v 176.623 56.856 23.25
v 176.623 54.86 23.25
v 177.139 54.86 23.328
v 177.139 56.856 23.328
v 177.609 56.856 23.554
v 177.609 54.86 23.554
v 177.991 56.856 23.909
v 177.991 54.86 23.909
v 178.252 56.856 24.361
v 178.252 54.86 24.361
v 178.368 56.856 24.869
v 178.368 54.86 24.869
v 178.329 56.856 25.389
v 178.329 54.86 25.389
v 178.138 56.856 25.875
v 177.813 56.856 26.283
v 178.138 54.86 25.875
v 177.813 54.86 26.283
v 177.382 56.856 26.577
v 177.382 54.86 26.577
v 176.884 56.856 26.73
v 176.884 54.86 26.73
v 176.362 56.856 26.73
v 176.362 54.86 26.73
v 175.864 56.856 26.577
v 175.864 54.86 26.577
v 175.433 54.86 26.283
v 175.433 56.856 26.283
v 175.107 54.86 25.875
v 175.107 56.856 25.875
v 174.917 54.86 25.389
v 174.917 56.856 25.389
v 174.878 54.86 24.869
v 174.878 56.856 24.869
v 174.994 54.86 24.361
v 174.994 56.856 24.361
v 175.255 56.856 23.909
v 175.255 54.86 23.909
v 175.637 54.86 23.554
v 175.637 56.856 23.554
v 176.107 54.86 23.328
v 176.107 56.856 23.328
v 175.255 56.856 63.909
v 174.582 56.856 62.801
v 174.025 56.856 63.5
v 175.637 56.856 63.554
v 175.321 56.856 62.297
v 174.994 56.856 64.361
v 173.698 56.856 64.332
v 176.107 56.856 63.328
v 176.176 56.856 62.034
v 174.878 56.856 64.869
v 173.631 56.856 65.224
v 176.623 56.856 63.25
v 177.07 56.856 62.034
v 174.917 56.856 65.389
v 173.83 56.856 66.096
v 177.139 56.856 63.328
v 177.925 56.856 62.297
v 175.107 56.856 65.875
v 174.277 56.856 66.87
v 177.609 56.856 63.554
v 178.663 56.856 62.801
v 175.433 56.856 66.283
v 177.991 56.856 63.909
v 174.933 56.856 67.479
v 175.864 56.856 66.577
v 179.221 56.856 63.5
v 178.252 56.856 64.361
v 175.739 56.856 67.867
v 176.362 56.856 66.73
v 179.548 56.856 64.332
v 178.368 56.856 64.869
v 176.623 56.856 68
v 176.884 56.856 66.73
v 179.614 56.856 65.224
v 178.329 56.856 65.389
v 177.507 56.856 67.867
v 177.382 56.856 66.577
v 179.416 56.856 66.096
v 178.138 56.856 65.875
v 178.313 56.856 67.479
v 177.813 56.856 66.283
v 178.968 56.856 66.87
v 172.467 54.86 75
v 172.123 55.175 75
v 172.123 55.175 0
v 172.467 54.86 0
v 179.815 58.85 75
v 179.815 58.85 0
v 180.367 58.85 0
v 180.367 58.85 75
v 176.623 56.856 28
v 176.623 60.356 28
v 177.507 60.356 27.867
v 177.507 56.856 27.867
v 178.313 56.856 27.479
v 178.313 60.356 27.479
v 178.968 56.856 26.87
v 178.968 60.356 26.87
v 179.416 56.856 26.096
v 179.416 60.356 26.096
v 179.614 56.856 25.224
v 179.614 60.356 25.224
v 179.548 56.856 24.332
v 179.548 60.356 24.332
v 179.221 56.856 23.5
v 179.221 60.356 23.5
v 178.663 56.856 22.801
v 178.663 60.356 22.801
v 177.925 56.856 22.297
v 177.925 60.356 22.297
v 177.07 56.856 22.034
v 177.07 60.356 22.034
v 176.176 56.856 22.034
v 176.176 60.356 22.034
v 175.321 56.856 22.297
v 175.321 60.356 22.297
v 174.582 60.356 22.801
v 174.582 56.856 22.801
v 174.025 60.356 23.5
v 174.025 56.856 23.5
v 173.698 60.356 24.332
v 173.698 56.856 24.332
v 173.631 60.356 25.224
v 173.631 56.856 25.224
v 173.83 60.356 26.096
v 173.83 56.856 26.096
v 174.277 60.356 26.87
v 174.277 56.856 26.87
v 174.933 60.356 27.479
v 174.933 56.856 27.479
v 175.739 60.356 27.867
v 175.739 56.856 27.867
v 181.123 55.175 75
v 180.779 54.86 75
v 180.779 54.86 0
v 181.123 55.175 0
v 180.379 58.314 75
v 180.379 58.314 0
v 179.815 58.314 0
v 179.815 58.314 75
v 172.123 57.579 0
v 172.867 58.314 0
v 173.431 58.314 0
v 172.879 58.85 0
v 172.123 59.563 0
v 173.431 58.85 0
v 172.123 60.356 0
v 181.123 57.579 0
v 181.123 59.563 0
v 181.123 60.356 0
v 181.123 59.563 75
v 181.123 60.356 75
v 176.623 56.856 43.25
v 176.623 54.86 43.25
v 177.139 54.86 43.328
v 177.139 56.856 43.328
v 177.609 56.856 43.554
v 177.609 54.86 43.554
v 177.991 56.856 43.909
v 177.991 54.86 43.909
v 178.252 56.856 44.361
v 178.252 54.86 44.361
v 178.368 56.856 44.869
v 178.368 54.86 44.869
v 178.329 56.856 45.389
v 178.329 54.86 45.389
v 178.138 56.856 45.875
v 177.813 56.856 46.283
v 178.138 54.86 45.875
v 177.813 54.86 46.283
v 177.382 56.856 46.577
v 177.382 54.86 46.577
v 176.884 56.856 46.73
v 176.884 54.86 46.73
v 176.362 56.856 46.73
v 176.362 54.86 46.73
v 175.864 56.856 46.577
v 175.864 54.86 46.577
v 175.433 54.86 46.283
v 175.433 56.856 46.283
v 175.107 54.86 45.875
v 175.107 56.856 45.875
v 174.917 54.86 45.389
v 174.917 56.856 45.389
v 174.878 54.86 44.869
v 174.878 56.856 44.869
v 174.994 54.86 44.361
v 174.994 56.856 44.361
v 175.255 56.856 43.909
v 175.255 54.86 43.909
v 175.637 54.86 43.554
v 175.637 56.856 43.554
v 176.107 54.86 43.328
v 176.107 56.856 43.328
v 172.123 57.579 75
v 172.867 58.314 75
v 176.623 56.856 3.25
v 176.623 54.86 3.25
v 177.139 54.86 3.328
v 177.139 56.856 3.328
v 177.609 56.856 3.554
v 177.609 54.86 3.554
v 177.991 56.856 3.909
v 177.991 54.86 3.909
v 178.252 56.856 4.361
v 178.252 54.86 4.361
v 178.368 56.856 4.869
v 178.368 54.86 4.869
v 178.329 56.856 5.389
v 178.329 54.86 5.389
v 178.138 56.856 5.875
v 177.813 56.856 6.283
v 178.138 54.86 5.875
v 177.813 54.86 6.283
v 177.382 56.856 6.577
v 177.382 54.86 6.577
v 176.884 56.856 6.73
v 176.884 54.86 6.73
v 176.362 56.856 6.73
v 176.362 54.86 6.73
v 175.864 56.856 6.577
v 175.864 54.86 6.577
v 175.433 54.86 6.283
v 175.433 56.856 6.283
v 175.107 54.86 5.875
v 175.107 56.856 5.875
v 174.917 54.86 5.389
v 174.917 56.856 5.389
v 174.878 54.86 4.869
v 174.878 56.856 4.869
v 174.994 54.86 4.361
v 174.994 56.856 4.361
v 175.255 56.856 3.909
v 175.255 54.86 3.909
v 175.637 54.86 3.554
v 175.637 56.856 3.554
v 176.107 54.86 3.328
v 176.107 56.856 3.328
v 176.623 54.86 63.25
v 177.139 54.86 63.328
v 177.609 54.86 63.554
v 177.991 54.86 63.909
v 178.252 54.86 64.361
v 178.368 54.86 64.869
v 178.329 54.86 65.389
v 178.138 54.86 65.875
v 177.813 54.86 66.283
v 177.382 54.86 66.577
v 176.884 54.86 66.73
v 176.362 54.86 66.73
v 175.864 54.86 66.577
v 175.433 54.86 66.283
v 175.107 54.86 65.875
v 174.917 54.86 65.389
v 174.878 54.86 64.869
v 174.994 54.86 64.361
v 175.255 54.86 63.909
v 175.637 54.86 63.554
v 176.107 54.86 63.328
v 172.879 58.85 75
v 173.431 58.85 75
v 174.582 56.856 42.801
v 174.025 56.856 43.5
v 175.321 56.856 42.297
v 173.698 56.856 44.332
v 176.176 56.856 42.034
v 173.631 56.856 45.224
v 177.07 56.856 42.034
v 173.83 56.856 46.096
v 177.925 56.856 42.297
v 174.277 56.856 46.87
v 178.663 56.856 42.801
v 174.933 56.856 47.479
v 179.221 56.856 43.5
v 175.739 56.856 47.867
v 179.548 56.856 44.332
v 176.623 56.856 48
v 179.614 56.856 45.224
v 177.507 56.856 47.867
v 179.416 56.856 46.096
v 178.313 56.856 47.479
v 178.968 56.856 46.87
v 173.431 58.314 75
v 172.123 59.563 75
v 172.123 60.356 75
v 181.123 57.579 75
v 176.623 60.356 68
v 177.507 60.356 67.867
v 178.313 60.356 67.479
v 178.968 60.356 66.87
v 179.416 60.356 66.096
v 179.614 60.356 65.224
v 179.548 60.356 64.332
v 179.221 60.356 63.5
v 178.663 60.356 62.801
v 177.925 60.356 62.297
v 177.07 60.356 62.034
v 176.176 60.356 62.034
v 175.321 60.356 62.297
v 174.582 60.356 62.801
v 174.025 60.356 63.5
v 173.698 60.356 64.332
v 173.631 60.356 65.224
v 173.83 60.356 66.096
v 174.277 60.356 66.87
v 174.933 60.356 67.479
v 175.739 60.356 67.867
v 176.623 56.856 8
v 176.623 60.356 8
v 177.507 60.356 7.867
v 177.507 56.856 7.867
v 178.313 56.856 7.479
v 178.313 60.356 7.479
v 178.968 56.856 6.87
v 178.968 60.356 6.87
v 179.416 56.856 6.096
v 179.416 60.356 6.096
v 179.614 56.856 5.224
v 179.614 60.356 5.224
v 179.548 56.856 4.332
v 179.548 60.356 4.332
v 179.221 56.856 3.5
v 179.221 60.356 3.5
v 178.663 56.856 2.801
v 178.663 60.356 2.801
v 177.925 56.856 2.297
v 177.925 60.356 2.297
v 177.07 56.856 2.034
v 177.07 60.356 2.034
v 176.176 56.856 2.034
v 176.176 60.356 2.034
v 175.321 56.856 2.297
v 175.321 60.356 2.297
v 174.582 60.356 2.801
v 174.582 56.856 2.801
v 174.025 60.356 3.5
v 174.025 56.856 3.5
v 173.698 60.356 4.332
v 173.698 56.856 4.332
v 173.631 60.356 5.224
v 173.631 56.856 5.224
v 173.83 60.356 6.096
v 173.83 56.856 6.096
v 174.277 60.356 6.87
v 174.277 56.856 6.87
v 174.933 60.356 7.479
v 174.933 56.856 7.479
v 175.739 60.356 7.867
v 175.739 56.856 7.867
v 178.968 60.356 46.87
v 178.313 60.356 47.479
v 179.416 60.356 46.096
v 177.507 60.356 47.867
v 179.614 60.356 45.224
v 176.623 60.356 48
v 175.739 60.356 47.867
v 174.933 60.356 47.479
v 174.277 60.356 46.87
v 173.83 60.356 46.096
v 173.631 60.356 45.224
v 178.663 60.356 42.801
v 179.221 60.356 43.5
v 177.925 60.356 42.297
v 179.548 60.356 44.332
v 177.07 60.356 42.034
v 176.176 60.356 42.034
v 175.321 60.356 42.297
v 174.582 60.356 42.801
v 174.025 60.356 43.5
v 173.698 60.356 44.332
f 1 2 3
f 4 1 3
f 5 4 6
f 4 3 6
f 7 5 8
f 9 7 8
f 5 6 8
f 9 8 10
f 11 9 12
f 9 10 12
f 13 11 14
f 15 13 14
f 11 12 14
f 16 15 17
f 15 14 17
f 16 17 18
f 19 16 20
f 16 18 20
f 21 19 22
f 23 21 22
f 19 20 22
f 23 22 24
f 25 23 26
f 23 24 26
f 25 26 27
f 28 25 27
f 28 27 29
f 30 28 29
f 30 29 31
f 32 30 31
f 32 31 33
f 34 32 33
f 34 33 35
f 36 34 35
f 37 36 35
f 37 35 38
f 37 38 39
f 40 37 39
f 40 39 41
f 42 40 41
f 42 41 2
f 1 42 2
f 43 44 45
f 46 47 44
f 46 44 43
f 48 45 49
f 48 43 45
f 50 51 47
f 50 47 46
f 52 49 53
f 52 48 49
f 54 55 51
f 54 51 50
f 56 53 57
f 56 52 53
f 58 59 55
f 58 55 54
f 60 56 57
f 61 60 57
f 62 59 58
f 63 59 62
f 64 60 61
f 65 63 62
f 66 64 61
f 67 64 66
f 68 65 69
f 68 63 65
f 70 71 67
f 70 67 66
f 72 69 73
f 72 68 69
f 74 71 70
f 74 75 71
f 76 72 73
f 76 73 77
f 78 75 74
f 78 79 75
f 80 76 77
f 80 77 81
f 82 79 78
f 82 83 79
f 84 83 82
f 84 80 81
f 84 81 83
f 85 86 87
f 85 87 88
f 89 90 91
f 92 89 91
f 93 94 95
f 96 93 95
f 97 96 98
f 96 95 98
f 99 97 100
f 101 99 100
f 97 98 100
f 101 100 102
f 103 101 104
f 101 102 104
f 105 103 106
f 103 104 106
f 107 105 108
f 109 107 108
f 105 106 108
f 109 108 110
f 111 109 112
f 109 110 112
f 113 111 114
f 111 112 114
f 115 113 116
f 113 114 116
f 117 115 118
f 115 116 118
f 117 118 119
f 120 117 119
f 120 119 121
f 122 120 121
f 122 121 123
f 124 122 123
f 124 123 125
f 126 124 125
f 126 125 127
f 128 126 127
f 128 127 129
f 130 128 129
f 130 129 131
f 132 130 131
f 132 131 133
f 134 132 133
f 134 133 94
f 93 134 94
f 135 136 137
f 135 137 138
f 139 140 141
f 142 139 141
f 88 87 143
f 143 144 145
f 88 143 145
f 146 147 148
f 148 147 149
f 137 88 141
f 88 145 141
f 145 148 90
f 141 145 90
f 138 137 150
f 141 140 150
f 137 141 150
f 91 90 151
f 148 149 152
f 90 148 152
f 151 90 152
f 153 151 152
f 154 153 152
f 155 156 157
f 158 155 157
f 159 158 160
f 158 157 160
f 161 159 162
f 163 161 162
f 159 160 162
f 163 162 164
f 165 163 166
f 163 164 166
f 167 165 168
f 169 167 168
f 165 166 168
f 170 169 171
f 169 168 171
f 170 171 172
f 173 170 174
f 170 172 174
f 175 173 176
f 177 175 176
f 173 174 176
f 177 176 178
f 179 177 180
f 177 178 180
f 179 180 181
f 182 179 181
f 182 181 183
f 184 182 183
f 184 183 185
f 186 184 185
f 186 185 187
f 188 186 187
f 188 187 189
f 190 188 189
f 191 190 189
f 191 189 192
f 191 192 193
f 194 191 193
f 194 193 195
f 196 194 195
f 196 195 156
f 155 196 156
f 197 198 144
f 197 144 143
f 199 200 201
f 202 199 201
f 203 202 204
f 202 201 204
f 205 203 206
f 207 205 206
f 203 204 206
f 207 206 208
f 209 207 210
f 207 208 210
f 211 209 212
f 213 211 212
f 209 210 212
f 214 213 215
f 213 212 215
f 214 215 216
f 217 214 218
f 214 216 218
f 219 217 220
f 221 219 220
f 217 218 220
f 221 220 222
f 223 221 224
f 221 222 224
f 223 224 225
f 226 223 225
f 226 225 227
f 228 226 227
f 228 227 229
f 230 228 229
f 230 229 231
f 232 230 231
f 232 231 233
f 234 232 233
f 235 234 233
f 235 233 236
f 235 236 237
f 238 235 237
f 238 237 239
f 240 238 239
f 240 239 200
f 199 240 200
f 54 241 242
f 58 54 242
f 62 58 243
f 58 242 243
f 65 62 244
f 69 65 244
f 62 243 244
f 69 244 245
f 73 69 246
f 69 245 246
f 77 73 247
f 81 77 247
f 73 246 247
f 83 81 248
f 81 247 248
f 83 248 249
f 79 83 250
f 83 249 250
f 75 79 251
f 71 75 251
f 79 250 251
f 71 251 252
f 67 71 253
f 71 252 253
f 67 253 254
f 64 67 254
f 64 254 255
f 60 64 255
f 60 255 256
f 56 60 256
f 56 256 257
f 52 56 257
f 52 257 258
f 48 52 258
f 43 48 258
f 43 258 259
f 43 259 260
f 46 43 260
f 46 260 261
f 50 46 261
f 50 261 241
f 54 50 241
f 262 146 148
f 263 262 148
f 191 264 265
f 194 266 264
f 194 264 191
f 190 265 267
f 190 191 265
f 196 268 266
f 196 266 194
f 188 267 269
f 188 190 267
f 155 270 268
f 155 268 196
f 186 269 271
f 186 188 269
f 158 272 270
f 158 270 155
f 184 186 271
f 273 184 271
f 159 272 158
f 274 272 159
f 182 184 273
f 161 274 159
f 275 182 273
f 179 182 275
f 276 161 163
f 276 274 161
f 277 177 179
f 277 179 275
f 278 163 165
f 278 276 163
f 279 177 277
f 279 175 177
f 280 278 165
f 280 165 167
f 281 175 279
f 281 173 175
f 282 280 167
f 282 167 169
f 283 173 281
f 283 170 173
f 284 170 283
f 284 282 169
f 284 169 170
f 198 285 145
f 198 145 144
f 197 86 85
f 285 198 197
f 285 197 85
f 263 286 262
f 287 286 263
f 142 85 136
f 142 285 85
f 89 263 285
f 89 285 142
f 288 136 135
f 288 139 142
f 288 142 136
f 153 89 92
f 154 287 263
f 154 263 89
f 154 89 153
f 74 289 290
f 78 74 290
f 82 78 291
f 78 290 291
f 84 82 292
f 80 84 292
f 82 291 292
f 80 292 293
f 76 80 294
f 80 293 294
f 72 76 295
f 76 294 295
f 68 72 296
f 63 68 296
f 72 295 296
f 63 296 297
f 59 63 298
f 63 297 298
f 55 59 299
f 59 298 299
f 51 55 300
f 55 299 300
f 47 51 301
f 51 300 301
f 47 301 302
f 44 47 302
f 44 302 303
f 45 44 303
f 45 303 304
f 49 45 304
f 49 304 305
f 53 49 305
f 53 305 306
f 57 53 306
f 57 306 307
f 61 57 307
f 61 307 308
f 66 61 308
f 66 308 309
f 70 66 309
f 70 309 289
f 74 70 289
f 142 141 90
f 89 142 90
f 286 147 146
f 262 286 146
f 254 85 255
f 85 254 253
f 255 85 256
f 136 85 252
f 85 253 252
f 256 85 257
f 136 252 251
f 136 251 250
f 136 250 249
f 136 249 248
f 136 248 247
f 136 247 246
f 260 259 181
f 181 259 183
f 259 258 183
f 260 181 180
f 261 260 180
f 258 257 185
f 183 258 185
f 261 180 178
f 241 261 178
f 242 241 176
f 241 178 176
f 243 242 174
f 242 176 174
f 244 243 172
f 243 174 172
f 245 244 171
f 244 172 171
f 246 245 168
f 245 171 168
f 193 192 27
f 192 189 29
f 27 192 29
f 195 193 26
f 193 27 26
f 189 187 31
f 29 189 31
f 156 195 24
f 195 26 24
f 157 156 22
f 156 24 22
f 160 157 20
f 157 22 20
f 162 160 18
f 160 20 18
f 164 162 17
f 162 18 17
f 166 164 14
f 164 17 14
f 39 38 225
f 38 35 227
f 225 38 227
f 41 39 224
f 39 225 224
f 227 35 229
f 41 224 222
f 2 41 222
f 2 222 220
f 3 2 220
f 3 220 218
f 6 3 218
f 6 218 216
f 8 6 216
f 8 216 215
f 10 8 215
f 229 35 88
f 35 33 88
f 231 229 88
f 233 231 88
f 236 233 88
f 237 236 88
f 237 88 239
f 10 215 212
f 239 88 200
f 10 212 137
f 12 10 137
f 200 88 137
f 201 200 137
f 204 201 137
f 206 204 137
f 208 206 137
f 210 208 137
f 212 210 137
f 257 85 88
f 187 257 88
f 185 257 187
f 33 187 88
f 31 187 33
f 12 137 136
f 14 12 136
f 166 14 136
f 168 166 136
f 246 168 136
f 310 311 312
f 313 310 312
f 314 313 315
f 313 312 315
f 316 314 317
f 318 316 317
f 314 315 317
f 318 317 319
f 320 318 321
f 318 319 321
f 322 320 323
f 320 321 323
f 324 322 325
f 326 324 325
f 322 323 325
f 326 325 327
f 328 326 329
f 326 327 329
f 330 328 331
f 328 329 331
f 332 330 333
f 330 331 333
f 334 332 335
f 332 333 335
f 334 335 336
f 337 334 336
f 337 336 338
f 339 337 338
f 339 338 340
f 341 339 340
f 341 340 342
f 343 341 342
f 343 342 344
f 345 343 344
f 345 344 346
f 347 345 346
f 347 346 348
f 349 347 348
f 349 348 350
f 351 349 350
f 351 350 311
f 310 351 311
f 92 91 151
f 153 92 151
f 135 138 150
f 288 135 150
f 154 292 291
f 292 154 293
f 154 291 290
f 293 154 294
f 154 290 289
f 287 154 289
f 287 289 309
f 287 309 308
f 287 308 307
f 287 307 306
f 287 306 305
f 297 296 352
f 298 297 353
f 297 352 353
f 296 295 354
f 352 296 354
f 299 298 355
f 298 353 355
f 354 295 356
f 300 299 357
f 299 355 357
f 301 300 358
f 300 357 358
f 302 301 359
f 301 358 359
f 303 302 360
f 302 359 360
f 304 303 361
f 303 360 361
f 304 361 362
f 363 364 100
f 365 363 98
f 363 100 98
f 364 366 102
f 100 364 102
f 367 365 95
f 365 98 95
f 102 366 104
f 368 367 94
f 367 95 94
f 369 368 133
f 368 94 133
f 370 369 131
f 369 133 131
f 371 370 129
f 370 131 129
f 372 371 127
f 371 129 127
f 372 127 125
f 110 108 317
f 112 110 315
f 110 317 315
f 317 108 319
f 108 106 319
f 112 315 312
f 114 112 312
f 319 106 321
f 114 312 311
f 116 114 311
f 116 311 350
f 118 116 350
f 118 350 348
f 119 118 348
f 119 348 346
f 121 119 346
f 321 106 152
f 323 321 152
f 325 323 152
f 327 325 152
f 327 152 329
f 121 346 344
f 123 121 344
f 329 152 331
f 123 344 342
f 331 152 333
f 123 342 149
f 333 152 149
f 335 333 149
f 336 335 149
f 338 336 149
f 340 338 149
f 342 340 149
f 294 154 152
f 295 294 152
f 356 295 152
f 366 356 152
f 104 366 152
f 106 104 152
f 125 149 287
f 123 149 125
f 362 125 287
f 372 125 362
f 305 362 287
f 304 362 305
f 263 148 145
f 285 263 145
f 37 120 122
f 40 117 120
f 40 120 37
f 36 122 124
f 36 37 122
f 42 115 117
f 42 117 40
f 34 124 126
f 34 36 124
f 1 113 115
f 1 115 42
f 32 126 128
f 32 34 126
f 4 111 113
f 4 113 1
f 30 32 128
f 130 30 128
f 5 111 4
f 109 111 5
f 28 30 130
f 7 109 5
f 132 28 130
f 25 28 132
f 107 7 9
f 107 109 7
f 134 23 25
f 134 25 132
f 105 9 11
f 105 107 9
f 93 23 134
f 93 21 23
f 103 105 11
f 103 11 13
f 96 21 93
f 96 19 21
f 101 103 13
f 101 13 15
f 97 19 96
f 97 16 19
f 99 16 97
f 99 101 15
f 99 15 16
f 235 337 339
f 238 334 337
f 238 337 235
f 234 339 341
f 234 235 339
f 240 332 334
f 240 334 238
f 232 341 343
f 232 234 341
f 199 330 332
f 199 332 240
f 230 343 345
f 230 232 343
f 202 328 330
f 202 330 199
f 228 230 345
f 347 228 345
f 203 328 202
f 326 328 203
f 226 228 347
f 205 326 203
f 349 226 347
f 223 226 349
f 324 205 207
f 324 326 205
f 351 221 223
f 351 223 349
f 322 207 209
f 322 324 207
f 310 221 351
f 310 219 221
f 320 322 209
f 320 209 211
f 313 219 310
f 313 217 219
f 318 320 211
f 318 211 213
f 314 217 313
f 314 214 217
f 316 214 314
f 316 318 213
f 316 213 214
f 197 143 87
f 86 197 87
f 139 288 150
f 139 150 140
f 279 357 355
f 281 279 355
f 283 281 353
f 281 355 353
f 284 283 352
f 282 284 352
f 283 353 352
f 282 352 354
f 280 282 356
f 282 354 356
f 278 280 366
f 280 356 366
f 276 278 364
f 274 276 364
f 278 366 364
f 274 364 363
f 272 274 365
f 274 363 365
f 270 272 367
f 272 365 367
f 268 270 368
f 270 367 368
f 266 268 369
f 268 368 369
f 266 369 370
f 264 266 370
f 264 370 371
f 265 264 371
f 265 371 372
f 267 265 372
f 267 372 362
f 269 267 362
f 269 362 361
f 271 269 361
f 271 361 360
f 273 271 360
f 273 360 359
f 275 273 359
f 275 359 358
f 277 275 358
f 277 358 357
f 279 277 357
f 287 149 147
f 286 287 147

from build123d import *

# Parameters (mm, degrees)
EXTRUDE_1_DEPTH              = 75
HOLE_WIZARD_M6_1_D           = 3.5
HOLE_WIZARD_M6_1_DEPTH       = 5.495410489
HOLE_WIZARD_M6_1_CBORE_D     = 6
HOLE_WIZARD_M6_1_CBORE_DEPTH = 3.5


with BuildPart() as part:
    # Model → 凸台-拉伸1 (new body)
    with BuildSketch(Plane.XY):
        Polygon((172.467003798, 54.860433324), (176.62288374, 54.860433324), (180.778763681, 54.860433324), (181.122753743, 55.174540135), (181.122753743, 57.578663559), (180.378777275, 58.313663309), (179.814791529, 58.313663309), (179.814791529, 58.850465041), (180.366775583, 58.850465041), (181.122753743, 59.563028946), (181.122753743, 60.355843813), (176.62288374, 60.355843813), (172.123013736, 60.355843813), (172.123013736, 59.563028946), (172.878991897, 58.850465041), (173.43097595, 58.850465041), (173.43097595, 58.313663309), (172.866992243, 58.313663309), (172.123013736, 57.578663559), (172.123013736, 55.174540135), align=None)
    extrude(amount=EXTRUDE_1_DEPTH)

    # M6 六角头螺栓的柱形沉头孔1
    with Locations(Plane(origin=(176.62288374, 60.355843813, 5), x_dir=(0, 0, 1), z_dir=(0, 1, 0))):
        with Locations((0, 0), (20, 0), (40, 0), (60, 0)):
            CounterBoreHole(HOLE_WIZARD_M6_1_D / 2, HOLE_WIZARD_M6_1_CBORE_D / 2, HOLE_WIZARD_M6_1_CBORE_DEPTH, depth=HOLE_WIZARD_M6_1_DEPTH)


solid = part.part
